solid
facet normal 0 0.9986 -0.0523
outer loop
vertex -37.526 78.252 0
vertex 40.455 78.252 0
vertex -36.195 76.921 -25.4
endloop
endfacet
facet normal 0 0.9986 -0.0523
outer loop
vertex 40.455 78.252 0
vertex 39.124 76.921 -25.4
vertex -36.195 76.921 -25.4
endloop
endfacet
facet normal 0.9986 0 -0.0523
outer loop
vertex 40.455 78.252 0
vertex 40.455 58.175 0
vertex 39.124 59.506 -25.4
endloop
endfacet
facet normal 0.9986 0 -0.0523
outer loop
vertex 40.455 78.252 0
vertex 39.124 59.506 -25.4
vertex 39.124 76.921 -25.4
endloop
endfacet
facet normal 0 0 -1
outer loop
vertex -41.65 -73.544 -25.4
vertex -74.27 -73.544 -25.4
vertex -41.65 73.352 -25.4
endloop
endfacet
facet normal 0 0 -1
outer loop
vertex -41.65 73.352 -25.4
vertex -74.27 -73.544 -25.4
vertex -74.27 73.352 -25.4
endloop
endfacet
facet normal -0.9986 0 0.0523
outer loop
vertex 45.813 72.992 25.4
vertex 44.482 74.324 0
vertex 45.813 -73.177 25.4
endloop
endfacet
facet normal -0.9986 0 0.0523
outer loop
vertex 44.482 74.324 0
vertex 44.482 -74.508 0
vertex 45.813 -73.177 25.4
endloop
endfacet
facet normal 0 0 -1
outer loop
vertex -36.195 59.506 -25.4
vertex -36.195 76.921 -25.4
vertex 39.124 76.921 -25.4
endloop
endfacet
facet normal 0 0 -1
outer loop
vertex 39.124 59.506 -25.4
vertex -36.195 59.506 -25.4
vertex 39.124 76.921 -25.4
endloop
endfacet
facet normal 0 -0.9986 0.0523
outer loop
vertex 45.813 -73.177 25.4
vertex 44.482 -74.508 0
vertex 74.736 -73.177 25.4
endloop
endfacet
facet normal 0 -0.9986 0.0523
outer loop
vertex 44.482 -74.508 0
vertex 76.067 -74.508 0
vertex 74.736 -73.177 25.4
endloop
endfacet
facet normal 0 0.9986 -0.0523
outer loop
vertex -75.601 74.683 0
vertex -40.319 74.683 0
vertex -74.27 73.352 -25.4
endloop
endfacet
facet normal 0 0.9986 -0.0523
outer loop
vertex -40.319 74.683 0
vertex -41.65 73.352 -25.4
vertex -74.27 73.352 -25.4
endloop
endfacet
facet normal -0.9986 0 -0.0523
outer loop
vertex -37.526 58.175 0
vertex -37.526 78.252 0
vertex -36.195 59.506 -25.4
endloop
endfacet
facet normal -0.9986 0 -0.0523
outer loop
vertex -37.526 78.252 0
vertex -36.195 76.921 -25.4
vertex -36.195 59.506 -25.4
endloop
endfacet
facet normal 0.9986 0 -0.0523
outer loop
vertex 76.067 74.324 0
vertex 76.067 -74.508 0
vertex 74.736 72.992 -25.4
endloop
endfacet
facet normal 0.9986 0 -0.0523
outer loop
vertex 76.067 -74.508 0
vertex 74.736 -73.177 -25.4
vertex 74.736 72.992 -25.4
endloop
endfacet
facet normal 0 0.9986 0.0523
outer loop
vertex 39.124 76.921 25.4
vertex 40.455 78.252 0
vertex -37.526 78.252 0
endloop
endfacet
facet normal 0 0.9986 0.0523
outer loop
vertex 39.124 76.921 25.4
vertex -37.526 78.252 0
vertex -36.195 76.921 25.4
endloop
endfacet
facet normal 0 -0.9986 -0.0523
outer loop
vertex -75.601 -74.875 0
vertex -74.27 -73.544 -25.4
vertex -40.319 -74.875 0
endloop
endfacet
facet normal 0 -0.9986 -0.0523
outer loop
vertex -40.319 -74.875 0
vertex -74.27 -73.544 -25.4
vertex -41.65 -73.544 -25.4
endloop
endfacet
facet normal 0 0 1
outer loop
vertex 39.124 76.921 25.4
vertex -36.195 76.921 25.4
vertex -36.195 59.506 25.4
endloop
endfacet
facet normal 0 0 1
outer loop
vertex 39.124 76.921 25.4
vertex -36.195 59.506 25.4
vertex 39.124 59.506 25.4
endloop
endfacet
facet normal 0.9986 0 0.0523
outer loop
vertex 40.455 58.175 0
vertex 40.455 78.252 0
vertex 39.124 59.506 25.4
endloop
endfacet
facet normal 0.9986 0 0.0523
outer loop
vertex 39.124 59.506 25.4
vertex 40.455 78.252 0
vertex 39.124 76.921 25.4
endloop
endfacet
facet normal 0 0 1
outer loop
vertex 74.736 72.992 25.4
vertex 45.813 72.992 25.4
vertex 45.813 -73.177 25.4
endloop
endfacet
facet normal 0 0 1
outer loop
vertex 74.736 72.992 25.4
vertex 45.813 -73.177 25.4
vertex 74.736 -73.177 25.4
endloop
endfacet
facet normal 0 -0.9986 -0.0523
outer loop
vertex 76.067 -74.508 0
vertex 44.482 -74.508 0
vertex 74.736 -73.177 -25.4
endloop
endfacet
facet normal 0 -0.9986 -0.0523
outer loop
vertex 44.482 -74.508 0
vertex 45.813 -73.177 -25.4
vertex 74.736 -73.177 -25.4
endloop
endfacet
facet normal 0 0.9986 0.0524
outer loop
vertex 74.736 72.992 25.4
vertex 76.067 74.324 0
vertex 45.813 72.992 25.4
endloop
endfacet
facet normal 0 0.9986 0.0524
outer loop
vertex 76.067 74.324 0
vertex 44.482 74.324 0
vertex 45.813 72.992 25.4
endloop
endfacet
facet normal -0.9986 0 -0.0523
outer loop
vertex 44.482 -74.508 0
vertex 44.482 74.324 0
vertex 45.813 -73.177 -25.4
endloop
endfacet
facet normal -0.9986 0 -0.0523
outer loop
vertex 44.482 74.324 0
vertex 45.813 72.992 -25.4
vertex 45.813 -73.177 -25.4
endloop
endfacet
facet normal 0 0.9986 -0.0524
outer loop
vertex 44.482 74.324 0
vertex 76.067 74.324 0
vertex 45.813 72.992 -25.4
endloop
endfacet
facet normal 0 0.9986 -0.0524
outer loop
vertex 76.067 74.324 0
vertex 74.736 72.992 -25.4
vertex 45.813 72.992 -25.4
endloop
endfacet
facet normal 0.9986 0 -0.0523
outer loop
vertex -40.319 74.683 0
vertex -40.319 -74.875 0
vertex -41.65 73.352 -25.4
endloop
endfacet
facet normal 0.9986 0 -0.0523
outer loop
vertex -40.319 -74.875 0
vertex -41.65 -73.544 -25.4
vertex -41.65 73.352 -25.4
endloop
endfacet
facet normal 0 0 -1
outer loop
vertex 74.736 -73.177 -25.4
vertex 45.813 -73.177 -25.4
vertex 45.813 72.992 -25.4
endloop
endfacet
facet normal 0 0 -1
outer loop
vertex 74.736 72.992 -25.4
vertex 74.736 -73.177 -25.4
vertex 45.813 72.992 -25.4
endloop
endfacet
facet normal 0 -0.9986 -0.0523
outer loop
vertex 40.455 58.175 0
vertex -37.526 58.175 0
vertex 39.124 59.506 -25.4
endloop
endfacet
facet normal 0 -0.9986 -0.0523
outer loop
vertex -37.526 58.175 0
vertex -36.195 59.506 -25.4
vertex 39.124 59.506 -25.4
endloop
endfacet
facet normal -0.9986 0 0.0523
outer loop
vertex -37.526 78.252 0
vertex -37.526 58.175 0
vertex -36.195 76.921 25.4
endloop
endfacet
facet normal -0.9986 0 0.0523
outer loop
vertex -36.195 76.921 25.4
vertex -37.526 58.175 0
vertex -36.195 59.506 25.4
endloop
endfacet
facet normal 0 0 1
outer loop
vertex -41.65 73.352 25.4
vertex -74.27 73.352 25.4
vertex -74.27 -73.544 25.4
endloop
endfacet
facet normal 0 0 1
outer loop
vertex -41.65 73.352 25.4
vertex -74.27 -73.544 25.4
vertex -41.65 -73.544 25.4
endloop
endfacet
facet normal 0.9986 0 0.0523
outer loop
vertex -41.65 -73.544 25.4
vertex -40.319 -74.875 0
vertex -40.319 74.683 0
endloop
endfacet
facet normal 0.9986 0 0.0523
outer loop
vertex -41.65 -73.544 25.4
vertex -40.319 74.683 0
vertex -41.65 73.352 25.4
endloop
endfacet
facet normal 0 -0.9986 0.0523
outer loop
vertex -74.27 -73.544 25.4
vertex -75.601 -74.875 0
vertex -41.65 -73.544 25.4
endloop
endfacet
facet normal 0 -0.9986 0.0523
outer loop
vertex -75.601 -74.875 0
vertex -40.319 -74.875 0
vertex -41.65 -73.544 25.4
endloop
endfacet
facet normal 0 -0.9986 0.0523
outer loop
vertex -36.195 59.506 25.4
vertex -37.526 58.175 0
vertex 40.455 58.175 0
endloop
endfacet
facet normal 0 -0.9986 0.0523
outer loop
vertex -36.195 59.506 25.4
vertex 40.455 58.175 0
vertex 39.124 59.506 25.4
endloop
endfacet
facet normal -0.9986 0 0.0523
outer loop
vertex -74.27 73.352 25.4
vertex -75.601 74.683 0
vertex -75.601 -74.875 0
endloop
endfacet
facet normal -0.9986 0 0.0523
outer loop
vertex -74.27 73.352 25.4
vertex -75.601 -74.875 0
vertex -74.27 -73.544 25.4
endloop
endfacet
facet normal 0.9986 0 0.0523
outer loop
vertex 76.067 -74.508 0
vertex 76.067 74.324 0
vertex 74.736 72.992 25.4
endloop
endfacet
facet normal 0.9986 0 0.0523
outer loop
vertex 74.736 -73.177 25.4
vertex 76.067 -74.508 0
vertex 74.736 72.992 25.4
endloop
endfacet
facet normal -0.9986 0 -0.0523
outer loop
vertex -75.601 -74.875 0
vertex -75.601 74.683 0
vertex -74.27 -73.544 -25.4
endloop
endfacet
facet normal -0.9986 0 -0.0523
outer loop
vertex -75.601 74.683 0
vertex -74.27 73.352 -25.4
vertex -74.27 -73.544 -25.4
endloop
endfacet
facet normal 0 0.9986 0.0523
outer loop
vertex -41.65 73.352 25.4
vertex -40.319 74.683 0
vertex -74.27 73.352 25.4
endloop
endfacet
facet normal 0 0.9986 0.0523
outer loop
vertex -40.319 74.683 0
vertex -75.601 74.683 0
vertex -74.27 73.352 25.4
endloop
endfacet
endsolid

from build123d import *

# Parameters (mm, degrees)
F0_W          = 35.2822542191
F0_H          = 149.5577171445
F1_DEPTH      = 25.4
F1_TAPER      = 3
F1_DEPTH_BACK = 25.4
F1_TAPER_BACK = 3
F2_W          = 31.5851569176
F2_H          = 148.8319560885
F3_DEPTH      = 25.4
F3_TAPER      = 3
F3_DEPTH_BACK = 25.4
F3_TAPER_BACK = 3
F4_W          = 77.9811963439
F4_H          = 20.0772061944
F5_DEPTH      = 25.4
F5_TAPER      = 3
F5_DEPTH_BACK = 25.4
F5_TAPER_BACK = 3


with BuildPart() as f1:
    # F0 (on Top) → F1 (new body, two sides)
    with BuildSketch(Plane.XY) as f1_sk:
        with Locations((-57.9603612423, -0.0958256423)):
            Rectangle(F0_W, F0_H)
    extrude(amount=-F1_DEPTH, taper=F1_TAPER)
    extrude(f1_sk.sketch, amount=F1_DEPTH_BACK, taper=F1_TAPER_BACK)


with BuildPart() as f3:
    # F2 (on Top) → F3 (new body, two sides)
    with BuildSketch(Plane.XY) as f3_sk:
        with Locations((60.2748245001, -0.0923760235)):
            Rectangle(F2_W, F2_H)
    extrude(amount=F3_DEPTH, taper=F3_TAPER)
    extrude(f3_sk.sketch, amount=-F3_DEPTH_BACK, taper=F3_TAPER_BACK)


with BuildPart() as f5:
    # F4 (on Top) → F5 (new body, two sides)
    with BuildSketch(Plane.XY) as f5_sk:
        with Locations((1.4644451439, 68.2131759822)):
            Rectangle(F4_W, F4_H)
    extrude(amount=-F5_DEPTH, taper=F5_TAPER)
    extrude(f5_sk.sketch, amount=F5_DEPTH_BACK, taper=F5_TAPER_BACK)


solid = Compound([f1.part, f3.part, f5.part])
